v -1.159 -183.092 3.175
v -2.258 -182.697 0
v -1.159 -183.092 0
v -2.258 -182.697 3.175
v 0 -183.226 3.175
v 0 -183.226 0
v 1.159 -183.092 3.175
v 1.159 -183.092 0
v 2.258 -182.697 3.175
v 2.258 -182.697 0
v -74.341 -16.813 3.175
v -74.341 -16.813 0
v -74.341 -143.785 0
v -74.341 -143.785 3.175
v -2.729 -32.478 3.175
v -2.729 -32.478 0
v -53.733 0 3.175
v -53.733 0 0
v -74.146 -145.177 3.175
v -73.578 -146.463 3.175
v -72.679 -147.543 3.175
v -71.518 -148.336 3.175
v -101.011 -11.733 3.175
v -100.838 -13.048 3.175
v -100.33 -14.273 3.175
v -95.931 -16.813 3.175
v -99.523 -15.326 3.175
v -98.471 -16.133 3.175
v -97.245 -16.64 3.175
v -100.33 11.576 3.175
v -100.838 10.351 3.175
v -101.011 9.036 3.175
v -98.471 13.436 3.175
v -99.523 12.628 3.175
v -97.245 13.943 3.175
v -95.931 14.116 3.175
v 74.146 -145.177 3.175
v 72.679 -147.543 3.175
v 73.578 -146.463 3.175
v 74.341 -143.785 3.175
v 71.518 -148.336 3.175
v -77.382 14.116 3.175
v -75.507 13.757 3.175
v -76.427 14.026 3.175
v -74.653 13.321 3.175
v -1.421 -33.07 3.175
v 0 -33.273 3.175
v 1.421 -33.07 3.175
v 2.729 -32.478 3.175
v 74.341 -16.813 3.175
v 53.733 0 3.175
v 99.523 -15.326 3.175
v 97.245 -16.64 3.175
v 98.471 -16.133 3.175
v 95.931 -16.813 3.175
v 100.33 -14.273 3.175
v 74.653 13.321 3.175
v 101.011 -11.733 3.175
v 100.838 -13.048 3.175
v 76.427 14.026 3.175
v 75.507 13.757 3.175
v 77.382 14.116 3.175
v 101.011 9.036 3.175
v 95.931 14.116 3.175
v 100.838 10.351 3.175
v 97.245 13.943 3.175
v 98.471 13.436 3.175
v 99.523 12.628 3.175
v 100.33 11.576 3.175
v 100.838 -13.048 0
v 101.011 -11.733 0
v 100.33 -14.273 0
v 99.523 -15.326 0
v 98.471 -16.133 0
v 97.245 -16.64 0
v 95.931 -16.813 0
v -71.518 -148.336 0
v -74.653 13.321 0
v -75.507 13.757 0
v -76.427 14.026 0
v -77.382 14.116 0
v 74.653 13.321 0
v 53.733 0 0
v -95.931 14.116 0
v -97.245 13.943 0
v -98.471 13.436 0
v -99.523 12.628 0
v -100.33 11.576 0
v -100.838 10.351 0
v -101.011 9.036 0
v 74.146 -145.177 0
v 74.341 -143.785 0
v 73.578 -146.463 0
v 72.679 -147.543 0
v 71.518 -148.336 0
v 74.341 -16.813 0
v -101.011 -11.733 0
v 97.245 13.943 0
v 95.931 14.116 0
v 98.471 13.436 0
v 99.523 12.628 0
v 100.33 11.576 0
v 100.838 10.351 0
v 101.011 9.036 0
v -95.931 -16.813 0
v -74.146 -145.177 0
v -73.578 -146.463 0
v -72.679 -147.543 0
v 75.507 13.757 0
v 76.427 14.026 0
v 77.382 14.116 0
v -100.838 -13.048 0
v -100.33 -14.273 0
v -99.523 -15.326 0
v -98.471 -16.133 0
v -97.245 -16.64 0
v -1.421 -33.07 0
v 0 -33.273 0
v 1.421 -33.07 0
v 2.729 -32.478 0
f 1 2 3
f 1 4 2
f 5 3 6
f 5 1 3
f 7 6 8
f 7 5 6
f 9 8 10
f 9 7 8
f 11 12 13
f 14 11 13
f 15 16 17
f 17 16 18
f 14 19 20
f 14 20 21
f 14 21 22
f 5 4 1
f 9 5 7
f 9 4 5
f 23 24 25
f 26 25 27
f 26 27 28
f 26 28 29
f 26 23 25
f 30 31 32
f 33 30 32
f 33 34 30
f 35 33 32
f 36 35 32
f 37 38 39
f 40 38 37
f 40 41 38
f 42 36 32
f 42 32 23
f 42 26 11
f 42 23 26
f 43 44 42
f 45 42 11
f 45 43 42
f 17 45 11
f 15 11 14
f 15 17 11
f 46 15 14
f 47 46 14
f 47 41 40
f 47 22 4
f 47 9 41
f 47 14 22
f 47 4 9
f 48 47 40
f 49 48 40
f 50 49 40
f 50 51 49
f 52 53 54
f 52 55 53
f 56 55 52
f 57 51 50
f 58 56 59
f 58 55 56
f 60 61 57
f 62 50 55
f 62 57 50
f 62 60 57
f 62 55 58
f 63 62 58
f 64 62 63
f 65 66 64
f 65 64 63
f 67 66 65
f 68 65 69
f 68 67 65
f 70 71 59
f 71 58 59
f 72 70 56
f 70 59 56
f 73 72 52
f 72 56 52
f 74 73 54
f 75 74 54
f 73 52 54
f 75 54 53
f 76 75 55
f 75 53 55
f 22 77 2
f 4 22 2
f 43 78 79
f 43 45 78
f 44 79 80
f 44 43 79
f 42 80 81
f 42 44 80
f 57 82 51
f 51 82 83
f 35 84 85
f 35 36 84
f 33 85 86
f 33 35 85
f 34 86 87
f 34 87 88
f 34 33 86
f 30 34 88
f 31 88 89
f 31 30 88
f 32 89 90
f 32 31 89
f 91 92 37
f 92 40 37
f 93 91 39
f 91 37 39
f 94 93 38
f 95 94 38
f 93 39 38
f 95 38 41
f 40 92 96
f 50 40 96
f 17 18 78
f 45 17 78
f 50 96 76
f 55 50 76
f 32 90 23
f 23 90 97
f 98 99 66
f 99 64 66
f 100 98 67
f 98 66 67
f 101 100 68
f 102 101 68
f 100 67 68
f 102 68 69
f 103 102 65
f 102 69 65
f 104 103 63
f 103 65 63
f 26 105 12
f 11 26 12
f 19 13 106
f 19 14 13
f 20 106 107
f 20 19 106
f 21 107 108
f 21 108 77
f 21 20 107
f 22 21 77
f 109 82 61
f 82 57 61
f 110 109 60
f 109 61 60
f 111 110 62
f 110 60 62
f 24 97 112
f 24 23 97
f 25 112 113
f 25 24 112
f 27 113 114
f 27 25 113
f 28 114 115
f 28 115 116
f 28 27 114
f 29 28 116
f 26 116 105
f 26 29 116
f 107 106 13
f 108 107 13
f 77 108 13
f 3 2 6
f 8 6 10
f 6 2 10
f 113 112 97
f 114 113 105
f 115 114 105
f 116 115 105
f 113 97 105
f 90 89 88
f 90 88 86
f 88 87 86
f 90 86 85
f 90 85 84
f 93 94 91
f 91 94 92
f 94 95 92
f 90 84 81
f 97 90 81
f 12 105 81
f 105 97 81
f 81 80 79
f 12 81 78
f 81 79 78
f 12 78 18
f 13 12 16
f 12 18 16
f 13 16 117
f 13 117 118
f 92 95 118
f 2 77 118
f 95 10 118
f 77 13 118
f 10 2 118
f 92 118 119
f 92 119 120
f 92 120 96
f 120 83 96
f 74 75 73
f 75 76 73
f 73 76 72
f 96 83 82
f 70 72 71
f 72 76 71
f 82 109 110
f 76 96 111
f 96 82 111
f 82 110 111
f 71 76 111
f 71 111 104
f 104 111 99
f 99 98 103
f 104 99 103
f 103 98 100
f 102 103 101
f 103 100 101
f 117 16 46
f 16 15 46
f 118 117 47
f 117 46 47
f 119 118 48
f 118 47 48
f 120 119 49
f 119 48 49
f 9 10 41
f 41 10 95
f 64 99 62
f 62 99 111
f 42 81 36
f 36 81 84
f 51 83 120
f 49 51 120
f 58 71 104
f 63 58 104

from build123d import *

# Parameters (mm, degrees)
F1_DEPTH = 3.175
F2_R     = 5.08
F3_R     = 5.08


# Not quite as in the source:
# - two fillets or chamfers of one size are made in one step


with BuildPart() as f1:
    # F0 (on Top) → F1 (new body)
    with BuildSketch(Plane.XY):
        Polygon((0, -34.215349704), (-53.7331599414, 0), (-75.9016672165, 14.1161106039), (-101.0106563997, 14.1161106039), (-101.0106563997, 7.5655808932), (-101.0106563997, 0), (-101.0106563997, -16.8134532869), (-74.3406563997, -16.8134532869), (-74.3406563997, -43.2344191068), (-74.3406563997, -119.4344191068), (-74.3406563997, -146.9356715679), (0, -183.8173121214), align=None)
        Polygon((53.7331599414, 0), (0, -34.215349704), (0, -183.8173121214), (74.3406563997, -146.9356715679), (74.3406563997, -119.4344191068), (74.3406563997, -43.2344191068), (74.3406563997, -16.8134532869), (101.0106563997, -16.8134532869), (101.0106563997, 14.1161106039), (75.9016672165, 14.1161106039), align=None)
    extrude(amount=F1_DEPTH)

    # F2
    f2_edges = [f1.edges().sort_by_distance(p)[0] for p in [
        (0, -34.21535, 1.5875),
    ]]
    fillet(f2_edges, radius=F2_R)

    # F3
    f3_edges = [f1.edges().sort_by_distance(p)[0] for p in [
        (-74.340656, -146.935672, 1.5875),
        (0, -183.817312, 1.5875),
        (74.340656, -146.935672, 1.5875),
        (-75.901667, 14.116111, 1.5875),
        (-101.010656, 14.116111, 1.5875),
        (75.901667, 14.116111, 1.5875),
        (-101.010656, -16.813453, 1.5875),
        (101.010656, 14.116111, 1.5875),
        (101.010656, -16.813453, 1.5875),
    ]]
    fillet(f3_edges, radius=F3_R)


solid = f1.part
